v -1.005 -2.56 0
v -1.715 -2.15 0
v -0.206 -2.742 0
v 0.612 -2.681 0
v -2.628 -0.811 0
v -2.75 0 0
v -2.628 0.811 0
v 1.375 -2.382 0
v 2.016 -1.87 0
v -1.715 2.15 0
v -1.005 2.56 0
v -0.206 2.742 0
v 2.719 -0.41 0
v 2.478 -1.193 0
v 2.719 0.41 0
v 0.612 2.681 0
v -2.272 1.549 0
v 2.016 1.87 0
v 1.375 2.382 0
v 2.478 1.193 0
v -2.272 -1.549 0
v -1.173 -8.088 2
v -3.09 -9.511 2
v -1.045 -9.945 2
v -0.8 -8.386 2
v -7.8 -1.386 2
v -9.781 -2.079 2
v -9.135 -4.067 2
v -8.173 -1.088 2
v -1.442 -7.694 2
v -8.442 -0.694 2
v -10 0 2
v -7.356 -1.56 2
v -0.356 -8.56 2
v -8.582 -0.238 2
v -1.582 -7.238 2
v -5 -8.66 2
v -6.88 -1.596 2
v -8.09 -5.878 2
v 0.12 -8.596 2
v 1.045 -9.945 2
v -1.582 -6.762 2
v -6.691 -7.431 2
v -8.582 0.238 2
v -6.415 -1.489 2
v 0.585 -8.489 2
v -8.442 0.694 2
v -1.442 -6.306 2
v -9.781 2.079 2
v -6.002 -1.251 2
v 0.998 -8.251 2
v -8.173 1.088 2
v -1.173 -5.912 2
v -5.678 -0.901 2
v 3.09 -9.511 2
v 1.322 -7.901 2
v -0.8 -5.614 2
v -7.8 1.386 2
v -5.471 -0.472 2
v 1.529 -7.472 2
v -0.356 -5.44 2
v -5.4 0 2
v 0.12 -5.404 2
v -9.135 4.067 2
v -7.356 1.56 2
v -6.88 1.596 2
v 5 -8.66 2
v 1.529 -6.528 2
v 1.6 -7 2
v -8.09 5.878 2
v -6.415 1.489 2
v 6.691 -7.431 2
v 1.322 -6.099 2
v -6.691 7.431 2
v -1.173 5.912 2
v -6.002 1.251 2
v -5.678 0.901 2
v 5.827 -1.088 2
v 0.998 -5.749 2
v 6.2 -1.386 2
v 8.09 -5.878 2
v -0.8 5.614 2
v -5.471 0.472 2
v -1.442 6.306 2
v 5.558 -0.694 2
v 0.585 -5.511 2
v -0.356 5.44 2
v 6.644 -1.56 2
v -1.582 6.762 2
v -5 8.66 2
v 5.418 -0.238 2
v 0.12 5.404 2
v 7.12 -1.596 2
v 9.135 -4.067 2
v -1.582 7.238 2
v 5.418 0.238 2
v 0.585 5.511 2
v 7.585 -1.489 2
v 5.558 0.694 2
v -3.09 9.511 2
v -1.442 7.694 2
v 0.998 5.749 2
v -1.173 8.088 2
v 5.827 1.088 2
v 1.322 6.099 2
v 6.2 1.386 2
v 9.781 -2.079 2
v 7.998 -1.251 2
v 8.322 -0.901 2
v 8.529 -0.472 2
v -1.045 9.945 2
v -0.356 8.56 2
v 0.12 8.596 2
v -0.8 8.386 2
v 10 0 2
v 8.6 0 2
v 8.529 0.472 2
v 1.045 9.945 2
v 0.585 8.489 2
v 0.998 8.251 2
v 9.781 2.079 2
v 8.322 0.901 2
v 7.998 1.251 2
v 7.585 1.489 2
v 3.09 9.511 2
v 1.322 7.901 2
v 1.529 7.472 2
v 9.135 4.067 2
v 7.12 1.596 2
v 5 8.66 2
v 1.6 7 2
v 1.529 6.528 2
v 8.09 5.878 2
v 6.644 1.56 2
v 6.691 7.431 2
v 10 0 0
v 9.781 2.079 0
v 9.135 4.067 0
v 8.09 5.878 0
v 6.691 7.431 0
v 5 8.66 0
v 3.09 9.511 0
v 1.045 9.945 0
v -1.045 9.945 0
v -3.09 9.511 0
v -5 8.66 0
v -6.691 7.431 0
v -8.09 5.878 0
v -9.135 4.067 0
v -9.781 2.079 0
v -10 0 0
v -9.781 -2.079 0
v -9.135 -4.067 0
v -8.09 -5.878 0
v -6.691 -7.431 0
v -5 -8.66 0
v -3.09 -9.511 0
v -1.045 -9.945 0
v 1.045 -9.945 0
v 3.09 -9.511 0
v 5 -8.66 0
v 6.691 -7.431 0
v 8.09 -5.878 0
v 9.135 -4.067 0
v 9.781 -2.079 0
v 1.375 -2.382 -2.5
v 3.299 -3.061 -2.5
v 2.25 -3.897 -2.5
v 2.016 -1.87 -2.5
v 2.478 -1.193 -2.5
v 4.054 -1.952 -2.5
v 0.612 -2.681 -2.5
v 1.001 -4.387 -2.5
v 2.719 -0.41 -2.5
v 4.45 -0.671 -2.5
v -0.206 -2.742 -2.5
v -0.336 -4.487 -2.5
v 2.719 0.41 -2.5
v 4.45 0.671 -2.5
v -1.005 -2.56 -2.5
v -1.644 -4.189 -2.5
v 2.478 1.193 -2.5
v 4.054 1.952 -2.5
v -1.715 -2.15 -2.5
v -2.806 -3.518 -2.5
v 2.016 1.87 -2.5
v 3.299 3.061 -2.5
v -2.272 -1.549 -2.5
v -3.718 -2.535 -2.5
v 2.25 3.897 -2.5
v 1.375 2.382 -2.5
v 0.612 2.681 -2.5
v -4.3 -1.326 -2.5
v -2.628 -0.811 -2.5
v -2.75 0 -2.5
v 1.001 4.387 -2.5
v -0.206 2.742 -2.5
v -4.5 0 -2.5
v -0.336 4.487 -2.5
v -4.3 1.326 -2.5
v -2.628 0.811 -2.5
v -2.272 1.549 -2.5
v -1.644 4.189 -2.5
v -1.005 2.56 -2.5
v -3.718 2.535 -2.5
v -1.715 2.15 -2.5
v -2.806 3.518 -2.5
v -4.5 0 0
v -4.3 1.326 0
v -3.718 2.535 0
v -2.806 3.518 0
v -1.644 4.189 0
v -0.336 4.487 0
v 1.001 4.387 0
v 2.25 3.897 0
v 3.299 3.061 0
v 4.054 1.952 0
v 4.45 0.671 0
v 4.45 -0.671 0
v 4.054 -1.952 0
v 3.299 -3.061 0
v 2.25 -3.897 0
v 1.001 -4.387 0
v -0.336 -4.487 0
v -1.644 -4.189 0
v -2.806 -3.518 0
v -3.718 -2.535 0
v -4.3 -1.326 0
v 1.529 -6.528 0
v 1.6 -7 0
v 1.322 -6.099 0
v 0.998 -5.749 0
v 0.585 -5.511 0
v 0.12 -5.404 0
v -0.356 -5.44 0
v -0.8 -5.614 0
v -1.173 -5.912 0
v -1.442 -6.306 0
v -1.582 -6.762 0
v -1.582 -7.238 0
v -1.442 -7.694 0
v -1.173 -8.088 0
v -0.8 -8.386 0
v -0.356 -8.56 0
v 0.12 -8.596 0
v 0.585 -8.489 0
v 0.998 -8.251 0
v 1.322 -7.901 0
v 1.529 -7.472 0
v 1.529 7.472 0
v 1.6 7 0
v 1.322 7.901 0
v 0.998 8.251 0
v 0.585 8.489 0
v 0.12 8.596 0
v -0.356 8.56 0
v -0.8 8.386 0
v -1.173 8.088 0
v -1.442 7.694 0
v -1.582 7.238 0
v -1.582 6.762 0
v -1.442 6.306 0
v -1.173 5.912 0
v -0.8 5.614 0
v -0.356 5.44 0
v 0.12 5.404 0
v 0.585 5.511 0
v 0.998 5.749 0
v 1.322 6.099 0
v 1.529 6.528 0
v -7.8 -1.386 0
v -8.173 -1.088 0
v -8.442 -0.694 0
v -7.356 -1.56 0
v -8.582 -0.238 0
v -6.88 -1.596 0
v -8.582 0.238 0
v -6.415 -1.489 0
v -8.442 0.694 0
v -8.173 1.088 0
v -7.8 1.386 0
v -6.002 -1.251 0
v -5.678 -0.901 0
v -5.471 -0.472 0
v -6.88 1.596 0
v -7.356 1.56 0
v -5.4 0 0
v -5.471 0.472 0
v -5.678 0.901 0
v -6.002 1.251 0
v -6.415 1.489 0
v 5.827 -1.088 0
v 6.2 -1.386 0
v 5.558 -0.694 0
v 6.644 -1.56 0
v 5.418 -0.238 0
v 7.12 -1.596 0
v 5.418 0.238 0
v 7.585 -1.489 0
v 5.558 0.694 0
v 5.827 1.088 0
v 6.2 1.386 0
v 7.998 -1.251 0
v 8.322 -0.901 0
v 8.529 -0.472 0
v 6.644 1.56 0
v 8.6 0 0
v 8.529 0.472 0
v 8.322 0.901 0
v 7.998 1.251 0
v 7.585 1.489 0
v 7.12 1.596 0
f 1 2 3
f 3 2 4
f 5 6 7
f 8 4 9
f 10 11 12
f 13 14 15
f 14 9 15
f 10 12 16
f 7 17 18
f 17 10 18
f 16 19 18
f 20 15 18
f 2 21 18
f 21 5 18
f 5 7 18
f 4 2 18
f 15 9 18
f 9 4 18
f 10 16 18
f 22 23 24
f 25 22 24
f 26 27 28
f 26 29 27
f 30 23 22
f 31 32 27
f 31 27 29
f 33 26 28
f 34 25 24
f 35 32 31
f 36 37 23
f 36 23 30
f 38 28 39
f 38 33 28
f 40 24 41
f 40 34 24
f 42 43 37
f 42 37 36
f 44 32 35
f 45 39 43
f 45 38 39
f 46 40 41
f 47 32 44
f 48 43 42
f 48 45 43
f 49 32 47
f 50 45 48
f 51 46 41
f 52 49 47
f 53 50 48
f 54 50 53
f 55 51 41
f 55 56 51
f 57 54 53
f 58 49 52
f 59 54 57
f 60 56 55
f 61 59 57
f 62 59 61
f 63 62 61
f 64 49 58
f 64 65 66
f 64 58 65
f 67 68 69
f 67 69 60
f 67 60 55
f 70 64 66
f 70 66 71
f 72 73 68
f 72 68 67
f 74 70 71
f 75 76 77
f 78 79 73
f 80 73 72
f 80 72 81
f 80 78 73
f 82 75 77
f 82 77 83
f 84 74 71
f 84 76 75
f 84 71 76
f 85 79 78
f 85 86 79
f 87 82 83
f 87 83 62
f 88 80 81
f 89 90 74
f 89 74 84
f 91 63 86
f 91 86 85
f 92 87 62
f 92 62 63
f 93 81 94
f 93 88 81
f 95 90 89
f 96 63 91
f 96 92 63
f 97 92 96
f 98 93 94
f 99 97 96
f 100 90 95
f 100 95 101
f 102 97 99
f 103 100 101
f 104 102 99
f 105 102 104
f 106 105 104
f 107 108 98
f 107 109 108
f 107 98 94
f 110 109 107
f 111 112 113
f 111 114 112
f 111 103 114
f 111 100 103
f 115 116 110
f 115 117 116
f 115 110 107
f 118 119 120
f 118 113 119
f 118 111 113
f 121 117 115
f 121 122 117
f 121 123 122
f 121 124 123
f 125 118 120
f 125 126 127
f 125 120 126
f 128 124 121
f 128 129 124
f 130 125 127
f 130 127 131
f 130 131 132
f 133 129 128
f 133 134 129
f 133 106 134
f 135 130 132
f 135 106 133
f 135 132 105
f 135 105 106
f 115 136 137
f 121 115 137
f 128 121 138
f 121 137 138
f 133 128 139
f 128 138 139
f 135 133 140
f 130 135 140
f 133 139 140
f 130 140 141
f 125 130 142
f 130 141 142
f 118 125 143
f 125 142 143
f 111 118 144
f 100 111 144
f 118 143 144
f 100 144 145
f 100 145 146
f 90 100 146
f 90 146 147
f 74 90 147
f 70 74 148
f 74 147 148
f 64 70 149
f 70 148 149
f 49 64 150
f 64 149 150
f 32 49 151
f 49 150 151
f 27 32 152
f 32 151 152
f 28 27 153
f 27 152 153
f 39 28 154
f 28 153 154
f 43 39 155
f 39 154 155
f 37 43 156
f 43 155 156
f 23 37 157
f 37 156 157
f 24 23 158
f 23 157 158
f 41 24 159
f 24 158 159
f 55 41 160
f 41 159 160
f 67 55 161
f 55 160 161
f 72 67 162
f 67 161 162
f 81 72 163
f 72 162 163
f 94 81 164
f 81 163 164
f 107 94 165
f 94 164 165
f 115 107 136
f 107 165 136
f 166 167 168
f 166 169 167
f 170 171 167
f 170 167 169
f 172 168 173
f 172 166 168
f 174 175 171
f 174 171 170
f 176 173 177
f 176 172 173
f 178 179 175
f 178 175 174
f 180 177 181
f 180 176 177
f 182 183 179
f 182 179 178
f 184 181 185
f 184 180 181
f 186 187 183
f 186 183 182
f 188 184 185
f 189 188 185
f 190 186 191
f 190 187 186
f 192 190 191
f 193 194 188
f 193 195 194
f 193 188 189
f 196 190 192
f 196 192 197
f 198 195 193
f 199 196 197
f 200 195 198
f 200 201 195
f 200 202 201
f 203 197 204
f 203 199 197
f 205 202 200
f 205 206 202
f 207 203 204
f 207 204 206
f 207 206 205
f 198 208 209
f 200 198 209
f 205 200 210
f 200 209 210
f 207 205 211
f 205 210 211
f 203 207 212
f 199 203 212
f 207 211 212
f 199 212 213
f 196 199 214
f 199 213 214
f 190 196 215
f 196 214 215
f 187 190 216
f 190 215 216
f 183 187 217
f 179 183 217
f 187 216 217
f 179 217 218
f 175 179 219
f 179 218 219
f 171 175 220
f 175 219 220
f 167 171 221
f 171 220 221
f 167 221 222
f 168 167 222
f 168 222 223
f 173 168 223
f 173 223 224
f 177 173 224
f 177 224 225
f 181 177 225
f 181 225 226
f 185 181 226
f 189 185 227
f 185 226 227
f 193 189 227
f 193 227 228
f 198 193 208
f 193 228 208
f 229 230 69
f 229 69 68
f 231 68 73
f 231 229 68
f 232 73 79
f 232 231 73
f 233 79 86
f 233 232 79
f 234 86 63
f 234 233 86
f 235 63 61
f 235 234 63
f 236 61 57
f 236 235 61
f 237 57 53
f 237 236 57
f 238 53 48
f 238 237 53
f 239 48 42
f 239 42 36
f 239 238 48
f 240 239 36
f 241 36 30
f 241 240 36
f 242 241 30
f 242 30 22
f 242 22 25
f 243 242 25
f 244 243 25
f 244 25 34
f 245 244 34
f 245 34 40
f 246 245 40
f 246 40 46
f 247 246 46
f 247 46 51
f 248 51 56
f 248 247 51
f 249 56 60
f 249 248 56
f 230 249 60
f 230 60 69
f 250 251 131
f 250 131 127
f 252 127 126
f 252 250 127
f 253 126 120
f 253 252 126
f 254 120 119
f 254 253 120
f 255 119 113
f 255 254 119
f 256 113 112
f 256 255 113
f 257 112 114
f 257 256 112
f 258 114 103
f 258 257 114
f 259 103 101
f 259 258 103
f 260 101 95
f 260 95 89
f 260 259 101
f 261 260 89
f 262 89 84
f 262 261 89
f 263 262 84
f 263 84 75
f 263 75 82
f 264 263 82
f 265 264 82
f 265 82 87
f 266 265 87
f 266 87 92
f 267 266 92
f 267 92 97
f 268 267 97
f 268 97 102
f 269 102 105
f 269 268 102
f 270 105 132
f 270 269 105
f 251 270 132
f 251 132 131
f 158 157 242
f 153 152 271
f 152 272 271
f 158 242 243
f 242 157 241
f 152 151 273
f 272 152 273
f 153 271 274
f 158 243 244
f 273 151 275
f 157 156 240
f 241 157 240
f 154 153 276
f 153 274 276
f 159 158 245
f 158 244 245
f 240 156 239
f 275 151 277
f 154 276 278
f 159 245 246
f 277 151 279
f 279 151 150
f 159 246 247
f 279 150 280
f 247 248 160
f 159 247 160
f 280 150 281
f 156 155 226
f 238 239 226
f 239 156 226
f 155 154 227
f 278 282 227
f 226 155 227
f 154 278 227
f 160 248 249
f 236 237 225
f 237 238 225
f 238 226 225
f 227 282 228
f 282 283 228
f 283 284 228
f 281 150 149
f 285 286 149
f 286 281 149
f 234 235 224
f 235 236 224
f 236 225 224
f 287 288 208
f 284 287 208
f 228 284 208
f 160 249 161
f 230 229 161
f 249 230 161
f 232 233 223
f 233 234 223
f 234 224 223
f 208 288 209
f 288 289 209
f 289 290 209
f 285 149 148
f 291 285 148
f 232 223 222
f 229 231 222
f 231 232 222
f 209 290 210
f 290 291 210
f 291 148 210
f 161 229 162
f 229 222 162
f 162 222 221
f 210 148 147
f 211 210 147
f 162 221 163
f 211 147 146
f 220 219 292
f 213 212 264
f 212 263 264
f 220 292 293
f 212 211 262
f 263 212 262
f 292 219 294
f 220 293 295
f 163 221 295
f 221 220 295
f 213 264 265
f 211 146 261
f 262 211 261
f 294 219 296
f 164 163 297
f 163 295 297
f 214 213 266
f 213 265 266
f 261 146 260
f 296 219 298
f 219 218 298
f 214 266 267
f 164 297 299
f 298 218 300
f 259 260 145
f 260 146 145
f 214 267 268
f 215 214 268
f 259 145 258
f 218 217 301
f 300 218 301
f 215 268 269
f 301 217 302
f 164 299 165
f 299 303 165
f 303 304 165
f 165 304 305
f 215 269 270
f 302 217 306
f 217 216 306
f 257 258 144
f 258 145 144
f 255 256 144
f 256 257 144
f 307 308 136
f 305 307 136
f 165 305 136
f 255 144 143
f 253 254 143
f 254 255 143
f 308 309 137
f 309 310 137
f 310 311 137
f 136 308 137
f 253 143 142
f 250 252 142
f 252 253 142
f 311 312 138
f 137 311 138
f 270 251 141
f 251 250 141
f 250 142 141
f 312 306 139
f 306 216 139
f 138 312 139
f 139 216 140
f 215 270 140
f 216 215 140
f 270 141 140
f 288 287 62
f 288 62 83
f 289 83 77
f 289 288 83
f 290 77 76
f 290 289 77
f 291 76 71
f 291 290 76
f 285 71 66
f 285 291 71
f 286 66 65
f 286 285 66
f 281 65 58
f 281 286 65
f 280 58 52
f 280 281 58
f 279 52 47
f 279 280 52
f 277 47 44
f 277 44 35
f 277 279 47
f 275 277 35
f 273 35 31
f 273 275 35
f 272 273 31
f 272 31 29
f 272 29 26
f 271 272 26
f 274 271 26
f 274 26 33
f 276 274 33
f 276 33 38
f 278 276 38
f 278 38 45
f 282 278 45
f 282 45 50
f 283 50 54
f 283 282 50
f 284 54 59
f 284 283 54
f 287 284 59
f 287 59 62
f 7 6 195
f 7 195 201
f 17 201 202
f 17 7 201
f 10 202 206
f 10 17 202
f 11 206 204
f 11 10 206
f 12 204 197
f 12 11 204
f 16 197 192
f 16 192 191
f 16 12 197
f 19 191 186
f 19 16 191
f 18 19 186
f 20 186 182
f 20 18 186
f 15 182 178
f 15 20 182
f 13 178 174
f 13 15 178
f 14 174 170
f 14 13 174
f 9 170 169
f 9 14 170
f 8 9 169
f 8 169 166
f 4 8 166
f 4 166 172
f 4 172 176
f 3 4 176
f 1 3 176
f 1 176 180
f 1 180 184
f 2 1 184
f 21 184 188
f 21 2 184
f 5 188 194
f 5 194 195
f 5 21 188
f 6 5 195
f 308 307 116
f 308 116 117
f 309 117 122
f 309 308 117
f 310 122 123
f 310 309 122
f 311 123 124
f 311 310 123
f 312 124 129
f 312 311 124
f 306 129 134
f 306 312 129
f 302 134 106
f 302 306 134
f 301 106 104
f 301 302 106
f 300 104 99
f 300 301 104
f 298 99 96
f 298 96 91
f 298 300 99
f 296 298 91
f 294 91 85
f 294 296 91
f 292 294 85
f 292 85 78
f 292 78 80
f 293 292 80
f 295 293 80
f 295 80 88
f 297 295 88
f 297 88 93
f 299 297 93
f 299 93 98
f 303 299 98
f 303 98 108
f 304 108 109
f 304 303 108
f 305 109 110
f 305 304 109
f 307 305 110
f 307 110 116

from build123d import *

# Parameters (mm, degrees)
SKETCH_1_R      = 10
SKETCH_1_R_2    = 1.6
EXTRUDE_1_DEPTH = 2
SKETCH_2_R      = 4.5
SKETCH_2_R_2    = 2.75
EXTRUDE_2_DEPTH = 2.5


with BuildPart() as part:
    # 草图1 → 凸台-拉伸1 (new body)
    with BuildSketch(Plane.XY):
        Circle(SKETCH_1_R)
        with Locations((0, 7)):
            Circle(SKETCH_1_R_2, mode=Mode.SUBTRACT)
        with Locations((7, 0)):
            Circle(SKETCH_1_R_2, mode=Mode.SUBTRACT)
        with Locations((0, -7)):
            Circle(SKETCH_1_R_2, mode=Mode.SUBTRACT)
        with Locations((-7, 0)):
            Circle(SKETCH_1_R_2, mode=Mode.SUBTRACT)
    extrude(amount=EXTRUDE_1_DEPTH)

    # 草图2 → 凸台-拉伸2 (add)
    with BuildSketch(Plane(origin=(0, 0, 0), x_dir=(-1, 0, 0), z_dir=(0, 0, -1))):
        Circle(SKETCH_2_R)
        Circle(SKETCH_2_R_2, mode=Mode.SUBTRACT)
    extrude(amount=EXTRUDE_2_DEPTH)


solid = part.part
